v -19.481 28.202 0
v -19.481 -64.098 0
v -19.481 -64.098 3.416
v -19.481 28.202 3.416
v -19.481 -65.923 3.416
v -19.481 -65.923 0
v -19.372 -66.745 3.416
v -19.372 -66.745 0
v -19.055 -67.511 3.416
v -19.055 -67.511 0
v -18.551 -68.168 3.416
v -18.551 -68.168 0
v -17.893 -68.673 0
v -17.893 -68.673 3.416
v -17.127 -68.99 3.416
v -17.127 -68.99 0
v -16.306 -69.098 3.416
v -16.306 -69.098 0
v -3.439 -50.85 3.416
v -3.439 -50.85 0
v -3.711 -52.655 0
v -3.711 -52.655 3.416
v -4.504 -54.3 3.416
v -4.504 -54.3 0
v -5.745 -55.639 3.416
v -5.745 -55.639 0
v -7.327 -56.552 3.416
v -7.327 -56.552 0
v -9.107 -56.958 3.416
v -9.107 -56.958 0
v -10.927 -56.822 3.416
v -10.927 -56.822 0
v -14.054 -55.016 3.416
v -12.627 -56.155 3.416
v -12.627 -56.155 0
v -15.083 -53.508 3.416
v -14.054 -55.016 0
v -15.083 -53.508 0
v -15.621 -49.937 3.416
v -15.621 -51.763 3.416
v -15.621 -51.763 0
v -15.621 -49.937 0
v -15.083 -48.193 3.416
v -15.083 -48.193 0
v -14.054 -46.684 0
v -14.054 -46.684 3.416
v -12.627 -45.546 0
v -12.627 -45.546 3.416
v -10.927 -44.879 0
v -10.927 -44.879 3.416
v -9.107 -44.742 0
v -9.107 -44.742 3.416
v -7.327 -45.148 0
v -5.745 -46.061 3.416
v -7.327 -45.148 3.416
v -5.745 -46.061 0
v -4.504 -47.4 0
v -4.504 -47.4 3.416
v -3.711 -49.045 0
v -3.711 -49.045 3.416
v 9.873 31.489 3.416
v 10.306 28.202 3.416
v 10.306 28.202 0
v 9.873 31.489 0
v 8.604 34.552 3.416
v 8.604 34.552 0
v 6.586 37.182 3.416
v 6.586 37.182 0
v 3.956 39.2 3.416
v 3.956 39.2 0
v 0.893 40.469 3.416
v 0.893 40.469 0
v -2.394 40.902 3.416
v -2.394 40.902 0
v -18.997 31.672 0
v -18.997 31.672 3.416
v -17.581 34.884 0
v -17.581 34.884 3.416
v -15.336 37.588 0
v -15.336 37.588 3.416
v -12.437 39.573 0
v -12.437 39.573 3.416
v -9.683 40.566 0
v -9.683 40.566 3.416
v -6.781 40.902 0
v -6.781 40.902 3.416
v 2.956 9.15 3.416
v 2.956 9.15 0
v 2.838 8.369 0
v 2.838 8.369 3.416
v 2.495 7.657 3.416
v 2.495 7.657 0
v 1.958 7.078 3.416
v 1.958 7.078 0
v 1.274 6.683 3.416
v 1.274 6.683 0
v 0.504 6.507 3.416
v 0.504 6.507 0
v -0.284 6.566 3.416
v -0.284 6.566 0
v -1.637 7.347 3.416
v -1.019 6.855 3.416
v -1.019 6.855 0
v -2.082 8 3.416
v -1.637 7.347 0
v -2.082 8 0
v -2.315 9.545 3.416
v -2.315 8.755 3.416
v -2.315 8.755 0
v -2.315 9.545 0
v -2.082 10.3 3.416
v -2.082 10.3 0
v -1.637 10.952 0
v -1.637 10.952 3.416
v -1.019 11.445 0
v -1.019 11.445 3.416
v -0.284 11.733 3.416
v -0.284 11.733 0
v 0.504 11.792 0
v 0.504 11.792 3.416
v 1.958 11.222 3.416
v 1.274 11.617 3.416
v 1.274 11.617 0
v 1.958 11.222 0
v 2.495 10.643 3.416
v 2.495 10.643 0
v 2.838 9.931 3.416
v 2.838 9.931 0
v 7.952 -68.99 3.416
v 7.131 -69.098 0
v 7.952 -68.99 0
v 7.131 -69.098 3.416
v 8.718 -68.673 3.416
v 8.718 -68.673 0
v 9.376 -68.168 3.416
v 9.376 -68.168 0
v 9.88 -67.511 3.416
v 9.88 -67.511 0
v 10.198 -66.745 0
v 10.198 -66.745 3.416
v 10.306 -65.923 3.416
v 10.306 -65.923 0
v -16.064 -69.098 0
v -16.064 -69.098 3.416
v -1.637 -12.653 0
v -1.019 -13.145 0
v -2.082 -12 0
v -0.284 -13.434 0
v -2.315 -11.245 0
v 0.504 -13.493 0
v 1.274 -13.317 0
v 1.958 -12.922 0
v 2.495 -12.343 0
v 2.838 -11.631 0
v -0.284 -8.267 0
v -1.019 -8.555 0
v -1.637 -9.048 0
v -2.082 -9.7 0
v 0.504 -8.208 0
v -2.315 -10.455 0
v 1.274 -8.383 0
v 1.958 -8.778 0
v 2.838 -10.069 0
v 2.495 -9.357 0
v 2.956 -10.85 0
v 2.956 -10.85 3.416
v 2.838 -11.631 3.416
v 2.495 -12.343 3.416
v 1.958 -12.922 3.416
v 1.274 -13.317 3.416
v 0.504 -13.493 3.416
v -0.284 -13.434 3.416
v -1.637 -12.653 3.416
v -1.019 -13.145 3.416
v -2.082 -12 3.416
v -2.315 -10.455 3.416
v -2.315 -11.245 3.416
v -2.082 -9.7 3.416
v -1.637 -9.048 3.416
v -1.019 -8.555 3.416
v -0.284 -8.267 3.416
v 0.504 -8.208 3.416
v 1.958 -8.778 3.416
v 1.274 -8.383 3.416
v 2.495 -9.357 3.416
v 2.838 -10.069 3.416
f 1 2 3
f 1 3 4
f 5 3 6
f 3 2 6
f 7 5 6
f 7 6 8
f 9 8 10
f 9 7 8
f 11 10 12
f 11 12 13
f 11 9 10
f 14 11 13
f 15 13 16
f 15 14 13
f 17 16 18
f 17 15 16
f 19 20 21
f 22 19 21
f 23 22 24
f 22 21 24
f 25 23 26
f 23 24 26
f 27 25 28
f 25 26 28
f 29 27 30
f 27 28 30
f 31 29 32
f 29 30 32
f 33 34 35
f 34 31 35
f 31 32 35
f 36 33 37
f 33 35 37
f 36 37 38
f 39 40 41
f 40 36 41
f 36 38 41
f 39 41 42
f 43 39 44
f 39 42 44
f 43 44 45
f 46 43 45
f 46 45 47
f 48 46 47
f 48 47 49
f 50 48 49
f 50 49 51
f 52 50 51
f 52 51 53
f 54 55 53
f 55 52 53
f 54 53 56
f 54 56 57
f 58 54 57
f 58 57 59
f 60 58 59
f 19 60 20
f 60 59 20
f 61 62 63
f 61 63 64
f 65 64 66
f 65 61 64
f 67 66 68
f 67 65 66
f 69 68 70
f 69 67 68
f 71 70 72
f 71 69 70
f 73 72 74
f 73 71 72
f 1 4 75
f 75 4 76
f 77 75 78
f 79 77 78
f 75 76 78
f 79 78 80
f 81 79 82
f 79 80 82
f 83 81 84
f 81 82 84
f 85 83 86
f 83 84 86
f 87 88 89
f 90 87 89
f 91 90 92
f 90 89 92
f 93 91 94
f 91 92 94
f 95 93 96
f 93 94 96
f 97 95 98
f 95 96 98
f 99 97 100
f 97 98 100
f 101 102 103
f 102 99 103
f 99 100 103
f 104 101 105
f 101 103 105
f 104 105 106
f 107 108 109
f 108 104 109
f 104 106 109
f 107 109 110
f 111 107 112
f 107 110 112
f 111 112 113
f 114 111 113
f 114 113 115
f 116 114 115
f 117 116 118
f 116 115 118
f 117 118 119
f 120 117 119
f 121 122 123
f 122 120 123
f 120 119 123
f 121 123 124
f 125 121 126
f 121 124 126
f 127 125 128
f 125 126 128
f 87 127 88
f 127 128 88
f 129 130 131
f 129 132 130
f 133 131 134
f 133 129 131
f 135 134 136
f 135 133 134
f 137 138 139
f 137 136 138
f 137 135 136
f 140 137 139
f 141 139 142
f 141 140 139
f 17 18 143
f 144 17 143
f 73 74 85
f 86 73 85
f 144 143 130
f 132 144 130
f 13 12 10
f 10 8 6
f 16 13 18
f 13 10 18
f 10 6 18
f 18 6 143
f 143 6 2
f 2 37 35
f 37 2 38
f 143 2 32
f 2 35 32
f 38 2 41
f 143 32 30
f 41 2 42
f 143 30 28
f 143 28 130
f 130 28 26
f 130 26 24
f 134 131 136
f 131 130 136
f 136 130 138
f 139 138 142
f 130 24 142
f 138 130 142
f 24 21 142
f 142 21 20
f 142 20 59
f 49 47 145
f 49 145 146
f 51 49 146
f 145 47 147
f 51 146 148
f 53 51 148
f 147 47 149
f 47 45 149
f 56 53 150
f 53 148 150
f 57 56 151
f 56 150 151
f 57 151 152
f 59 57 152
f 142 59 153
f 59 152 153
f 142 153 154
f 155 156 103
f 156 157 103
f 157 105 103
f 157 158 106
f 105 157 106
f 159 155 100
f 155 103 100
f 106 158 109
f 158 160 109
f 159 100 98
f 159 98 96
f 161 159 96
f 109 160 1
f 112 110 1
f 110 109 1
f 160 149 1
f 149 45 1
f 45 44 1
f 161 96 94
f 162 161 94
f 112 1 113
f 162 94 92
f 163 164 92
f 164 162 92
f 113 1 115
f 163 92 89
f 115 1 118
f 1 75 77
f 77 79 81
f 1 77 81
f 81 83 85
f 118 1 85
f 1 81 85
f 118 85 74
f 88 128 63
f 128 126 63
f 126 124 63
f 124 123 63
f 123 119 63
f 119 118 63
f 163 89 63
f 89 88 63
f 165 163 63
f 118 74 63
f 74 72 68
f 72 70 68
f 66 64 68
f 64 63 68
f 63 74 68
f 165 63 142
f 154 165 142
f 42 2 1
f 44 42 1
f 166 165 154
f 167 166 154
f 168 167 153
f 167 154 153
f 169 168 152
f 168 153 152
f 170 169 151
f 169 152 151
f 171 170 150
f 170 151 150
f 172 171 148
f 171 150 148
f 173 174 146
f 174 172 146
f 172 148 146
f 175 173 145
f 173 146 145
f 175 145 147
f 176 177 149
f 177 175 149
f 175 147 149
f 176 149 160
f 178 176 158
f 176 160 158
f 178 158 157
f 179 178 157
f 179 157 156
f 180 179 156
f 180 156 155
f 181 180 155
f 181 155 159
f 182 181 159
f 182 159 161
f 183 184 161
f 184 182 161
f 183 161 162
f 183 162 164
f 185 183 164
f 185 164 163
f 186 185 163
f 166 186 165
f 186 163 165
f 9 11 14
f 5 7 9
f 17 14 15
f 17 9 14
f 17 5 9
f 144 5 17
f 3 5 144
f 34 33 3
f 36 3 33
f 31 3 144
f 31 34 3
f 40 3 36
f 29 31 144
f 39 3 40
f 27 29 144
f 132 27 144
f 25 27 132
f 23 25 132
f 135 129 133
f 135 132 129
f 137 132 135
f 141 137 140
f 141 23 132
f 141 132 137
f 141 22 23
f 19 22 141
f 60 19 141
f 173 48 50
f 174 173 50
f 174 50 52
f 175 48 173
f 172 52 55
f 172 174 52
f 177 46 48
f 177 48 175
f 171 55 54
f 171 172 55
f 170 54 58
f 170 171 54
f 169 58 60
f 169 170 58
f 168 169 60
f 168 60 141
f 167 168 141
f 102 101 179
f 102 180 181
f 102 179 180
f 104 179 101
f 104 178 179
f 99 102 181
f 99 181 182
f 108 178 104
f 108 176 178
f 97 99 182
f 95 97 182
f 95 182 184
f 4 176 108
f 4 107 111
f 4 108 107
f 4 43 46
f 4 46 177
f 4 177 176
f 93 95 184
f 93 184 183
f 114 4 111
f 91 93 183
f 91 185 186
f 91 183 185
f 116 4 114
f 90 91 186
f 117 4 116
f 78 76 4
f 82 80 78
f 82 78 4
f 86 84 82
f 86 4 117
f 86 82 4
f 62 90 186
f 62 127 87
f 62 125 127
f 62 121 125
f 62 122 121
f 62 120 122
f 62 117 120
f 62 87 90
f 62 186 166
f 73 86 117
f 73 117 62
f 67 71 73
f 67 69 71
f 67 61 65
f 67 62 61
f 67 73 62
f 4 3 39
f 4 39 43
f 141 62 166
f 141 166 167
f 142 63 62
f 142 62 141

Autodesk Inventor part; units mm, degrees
ref_plane "YZ Plane" through (0, 0, 0) normal (1, 0, 0) x (0, 1, 0)
ref_plane "XZ Plane" through (0, 0, 0) normal (0, 1, 0) x (-1, 0, 0)
ref_plane "XY Plane" through (0, 0, 0) normal (0, 0, 1) x (1, 0, 0)
sketch "Sketch1" plane through (0, 0, 0) normal (0, 0, 1) x (1, 0, 0)
  line L0 (-19.4806, -69.0981) -> (-16.0643, -69.0981) projected
  line L1 (-16.0643, 40.9019) -> (-19.4806, 40.9019) projected
  circle A0 centre (0.3057, -10.8501) radius 2.65 projected
  circle A1 centre (0.3057, 9.1499) radius 2.65 projected
  line L2 (-19.4806, -64.0981) -> (-19.4806, 35.9019) projected
  line L3 (60.4357, -17.8501) -> (60.4357, 16.1499) projected
  arc A2 (32.4357, 9.8999) -> (32.4357, -11.6001) centre (32.4357, -0.8501) ccw projected
  circle A3 centre (-9.5643, -50.8501) radius 6.125 projected
  line L4 (10.3057, 75.9749) -> (10.3057, -77.6751) projected
  line L5 (-19.4806, -69.0981) -> (10.3057, -69.0981)
  line L6 (10.3057, -69.0981) -> (10.3057, 40.9019)
  line L7 (10.3057, 40.9019) -> (-19.4806, 40.9019)
  line L8 (-19.4806, 40.9019) -> (-19.4806, -69.0981)
  point P0 (0, 0)
extrude "Extrusion1" add sketch "Sketch1" along normal blind 3.4163
fillet "Fillet1" radius 3.175 2 edges at (10.3057, -69.0981, 1.7082) (-19.4806, -69.0981, 1.7082)
fillet "Fillet2" radius 12.7 2 edges at (-19.4806, 40.9019, 1.7082) (10.3057, 40.9019, 1.7082)
properties part number "z_screw_bottom_mount" material "Steel, Mild"
